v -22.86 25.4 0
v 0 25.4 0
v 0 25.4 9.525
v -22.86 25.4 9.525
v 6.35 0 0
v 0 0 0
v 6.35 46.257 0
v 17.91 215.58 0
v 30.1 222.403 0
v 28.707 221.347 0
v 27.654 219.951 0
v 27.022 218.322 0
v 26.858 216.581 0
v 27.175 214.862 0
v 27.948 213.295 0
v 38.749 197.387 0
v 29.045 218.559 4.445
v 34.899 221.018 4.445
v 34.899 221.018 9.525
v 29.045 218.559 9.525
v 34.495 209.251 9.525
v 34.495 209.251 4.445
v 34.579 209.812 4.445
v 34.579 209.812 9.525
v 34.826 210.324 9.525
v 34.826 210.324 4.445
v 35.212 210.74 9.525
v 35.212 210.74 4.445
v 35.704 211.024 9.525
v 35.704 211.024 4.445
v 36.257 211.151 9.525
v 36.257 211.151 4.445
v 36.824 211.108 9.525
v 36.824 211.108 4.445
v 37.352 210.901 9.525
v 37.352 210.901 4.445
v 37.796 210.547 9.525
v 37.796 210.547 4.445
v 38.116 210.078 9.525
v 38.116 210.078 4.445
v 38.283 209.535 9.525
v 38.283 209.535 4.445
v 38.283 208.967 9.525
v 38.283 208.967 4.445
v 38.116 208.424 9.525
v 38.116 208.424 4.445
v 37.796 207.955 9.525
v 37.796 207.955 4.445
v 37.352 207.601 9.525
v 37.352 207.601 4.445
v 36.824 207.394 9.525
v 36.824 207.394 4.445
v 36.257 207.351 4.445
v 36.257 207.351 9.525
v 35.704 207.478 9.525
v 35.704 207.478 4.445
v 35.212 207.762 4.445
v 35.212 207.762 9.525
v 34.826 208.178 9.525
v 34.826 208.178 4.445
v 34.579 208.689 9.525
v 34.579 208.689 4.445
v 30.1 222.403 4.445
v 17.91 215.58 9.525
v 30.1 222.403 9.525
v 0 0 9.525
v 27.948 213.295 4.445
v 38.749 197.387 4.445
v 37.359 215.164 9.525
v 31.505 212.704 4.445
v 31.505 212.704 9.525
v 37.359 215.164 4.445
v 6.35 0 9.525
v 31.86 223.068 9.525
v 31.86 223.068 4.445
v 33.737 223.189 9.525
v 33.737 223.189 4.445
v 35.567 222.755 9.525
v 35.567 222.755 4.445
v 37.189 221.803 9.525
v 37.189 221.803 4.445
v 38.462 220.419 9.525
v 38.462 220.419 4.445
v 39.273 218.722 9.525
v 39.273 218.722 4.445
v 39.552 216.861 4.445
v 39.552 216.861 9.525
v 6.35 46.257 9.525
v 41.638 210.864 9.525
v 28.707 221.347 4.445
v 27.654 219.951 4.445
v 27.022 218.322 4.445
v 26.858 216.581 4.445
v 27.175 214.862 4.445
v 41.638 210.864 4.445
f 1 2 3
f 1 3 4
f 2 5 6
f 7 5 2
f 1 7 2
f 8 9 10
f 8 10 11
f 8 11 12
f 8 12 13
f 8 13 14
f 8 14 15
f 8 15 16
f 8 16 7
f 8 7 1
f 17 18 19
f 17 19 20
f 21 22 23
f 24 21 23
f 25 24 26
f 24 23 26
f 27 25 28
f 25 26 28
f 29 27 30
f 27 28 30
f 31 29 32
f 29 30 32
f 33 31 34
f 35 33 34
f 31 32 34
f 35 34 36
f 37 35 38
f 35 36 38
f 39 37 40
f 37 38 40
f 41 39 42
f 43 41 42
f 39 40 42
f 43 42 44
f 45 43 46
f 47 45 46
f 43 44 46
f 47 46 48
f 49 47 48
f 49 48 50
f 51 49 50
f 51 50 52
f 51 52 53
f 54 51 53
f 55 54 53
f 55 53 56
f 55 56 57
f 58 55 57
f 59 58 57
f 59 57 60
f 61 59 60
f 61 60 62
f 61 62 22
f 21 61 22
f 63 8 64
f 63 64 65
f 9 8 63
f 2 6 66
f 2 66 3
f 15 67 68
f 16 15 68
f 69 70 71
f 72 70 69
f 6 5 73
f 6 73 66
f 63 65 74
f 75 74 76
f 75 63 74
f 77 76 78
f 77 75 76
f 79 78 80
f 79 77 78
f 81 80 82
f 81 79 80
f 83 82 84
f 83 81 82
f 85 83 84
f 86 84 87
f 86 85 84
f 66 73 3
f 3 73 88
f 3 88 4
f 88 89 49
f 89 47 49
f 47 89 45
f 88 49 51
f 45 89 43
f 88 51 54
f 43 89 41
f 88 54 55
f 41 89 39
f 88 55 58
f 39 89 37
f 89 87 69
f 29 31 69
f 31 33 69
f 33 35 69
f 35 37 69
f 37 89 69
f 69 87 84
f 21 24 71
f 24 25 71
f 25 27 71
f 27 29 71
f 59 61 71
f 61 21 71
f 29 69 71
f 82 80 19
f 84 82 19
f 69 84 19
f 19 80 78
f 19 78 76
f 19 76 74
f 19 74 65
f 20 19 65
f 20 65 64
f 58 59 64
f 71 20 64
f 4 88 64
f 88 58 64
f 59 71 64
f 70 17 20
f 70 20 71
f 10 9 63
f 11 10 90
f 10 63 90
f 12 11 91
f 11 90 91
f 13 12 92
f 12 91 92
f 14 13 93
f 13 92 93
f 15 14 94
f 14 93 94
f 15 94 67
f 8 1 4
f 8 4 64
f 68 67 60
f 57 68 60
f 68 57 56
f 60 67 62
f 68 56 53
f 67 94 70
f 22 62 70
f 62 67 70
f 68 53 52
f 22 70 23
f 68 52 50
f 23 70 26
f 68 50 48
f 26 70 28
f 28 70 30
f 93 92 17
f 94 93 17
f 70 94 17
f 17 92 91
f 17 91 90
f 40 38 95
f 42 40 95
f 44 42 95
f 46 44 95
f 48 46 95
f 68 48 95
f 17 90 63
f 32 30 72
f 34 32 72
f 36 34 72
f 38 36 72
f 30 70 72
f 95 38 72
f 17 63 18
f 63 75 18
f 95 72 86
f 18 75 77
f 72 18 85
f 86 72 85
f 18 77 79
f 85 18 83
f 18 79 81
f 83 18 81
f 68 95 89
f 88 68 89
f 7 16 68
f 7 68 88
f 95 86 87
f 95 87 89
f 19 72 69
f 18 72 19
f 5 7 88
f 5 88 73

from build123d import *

# Parameters (mm, degrees)
BOSS_EXTRUDE1_DEPTH = 9.525
CUT_EXTRUDE1_START  = -4.445
CUT_EXTRUDE1_DEPTH  = 4.445
SKETCH4_R           = 1.905
CUT_EXTRUDE2_DEPTH  = 228.118627562


with BuildPart() as part:
    # Sketch1 → Boss-Extrude1 (new body)
    with BuildSketch(Plane.XY):
        with BuildLine():
            Line((0, 0), (0, 25.4))
            Line((0, 25.4), (-22.86, 25.4))
            Line((-22.86, 25.4), (17.910019334, 215.579524422))
            Line((17.910019334, 215.579524422), (30.10047331, 222.402553944))
            ThreePointArc((30.10047331, 222.402553944), (36.413450877, 222.339405473), (39.551850365, 216.861438501))
            Line((39.551850365, 216.861438501), (41.637943134, 210.86387925))
            Line((41.637943134, 210.86387925), (6.35, 46.256543942))
            Line((6.35, 46.256543942), (6.35, 0))
            Line((6.35, 0), (0, 0))
        make_face()
    extrude(amount=BOSS_EXTRUDE1_DEPTH)

    # Sketch2 → Cut-Extrude1 (cut)
    with BuildSketch(Plane(origin=(0, 0, 0), x_dir=(-1, 0, 0), z_dir=(0, 0, -1)).offset(CUT_EXTRUDE1_START)):
        with BuildLine():
            Line((-41.637943134, 210.86387925), (-39.551850365, 216.861438501))
            ThreePointArc((-39.551850365, 216.861438501), (-31.336031581, 222.931135385), (-27.948316423, 213.29452371))
            Line((-27.948316423, 213.29452371), (-38.748816351, 197.386996815))
            Line((-38.748816351, 197.386996815), (-41.637943134, 210.86387925))
        make_face()
    extrude(amount=CUT_EXTRUDE1_DEPTH, mode=Mode.SUBTRACT)

    # Sketch4 → Cut-Extrude2 (cut, through all)
    with BuildSketch(Plane(origin=(0, 0, 4.445), x_dir=(-1, 0, 0), z_dir=(0, 0, -1))):
        with Locations((-36.399614201, 209.250963387)):
            Circle(SKETCH4_R)
        Polygon((-29.044835385, 218.558635146), (-31.50465372, 212.70442352), (-37.358865346, 215.164241855), (-34.89904701, 221.018453481), align=None)
    extrude(amount=-CUT_EXTRUDE2_DEPTH, mode=Mode.SUBTRACT)


solid = part.part
